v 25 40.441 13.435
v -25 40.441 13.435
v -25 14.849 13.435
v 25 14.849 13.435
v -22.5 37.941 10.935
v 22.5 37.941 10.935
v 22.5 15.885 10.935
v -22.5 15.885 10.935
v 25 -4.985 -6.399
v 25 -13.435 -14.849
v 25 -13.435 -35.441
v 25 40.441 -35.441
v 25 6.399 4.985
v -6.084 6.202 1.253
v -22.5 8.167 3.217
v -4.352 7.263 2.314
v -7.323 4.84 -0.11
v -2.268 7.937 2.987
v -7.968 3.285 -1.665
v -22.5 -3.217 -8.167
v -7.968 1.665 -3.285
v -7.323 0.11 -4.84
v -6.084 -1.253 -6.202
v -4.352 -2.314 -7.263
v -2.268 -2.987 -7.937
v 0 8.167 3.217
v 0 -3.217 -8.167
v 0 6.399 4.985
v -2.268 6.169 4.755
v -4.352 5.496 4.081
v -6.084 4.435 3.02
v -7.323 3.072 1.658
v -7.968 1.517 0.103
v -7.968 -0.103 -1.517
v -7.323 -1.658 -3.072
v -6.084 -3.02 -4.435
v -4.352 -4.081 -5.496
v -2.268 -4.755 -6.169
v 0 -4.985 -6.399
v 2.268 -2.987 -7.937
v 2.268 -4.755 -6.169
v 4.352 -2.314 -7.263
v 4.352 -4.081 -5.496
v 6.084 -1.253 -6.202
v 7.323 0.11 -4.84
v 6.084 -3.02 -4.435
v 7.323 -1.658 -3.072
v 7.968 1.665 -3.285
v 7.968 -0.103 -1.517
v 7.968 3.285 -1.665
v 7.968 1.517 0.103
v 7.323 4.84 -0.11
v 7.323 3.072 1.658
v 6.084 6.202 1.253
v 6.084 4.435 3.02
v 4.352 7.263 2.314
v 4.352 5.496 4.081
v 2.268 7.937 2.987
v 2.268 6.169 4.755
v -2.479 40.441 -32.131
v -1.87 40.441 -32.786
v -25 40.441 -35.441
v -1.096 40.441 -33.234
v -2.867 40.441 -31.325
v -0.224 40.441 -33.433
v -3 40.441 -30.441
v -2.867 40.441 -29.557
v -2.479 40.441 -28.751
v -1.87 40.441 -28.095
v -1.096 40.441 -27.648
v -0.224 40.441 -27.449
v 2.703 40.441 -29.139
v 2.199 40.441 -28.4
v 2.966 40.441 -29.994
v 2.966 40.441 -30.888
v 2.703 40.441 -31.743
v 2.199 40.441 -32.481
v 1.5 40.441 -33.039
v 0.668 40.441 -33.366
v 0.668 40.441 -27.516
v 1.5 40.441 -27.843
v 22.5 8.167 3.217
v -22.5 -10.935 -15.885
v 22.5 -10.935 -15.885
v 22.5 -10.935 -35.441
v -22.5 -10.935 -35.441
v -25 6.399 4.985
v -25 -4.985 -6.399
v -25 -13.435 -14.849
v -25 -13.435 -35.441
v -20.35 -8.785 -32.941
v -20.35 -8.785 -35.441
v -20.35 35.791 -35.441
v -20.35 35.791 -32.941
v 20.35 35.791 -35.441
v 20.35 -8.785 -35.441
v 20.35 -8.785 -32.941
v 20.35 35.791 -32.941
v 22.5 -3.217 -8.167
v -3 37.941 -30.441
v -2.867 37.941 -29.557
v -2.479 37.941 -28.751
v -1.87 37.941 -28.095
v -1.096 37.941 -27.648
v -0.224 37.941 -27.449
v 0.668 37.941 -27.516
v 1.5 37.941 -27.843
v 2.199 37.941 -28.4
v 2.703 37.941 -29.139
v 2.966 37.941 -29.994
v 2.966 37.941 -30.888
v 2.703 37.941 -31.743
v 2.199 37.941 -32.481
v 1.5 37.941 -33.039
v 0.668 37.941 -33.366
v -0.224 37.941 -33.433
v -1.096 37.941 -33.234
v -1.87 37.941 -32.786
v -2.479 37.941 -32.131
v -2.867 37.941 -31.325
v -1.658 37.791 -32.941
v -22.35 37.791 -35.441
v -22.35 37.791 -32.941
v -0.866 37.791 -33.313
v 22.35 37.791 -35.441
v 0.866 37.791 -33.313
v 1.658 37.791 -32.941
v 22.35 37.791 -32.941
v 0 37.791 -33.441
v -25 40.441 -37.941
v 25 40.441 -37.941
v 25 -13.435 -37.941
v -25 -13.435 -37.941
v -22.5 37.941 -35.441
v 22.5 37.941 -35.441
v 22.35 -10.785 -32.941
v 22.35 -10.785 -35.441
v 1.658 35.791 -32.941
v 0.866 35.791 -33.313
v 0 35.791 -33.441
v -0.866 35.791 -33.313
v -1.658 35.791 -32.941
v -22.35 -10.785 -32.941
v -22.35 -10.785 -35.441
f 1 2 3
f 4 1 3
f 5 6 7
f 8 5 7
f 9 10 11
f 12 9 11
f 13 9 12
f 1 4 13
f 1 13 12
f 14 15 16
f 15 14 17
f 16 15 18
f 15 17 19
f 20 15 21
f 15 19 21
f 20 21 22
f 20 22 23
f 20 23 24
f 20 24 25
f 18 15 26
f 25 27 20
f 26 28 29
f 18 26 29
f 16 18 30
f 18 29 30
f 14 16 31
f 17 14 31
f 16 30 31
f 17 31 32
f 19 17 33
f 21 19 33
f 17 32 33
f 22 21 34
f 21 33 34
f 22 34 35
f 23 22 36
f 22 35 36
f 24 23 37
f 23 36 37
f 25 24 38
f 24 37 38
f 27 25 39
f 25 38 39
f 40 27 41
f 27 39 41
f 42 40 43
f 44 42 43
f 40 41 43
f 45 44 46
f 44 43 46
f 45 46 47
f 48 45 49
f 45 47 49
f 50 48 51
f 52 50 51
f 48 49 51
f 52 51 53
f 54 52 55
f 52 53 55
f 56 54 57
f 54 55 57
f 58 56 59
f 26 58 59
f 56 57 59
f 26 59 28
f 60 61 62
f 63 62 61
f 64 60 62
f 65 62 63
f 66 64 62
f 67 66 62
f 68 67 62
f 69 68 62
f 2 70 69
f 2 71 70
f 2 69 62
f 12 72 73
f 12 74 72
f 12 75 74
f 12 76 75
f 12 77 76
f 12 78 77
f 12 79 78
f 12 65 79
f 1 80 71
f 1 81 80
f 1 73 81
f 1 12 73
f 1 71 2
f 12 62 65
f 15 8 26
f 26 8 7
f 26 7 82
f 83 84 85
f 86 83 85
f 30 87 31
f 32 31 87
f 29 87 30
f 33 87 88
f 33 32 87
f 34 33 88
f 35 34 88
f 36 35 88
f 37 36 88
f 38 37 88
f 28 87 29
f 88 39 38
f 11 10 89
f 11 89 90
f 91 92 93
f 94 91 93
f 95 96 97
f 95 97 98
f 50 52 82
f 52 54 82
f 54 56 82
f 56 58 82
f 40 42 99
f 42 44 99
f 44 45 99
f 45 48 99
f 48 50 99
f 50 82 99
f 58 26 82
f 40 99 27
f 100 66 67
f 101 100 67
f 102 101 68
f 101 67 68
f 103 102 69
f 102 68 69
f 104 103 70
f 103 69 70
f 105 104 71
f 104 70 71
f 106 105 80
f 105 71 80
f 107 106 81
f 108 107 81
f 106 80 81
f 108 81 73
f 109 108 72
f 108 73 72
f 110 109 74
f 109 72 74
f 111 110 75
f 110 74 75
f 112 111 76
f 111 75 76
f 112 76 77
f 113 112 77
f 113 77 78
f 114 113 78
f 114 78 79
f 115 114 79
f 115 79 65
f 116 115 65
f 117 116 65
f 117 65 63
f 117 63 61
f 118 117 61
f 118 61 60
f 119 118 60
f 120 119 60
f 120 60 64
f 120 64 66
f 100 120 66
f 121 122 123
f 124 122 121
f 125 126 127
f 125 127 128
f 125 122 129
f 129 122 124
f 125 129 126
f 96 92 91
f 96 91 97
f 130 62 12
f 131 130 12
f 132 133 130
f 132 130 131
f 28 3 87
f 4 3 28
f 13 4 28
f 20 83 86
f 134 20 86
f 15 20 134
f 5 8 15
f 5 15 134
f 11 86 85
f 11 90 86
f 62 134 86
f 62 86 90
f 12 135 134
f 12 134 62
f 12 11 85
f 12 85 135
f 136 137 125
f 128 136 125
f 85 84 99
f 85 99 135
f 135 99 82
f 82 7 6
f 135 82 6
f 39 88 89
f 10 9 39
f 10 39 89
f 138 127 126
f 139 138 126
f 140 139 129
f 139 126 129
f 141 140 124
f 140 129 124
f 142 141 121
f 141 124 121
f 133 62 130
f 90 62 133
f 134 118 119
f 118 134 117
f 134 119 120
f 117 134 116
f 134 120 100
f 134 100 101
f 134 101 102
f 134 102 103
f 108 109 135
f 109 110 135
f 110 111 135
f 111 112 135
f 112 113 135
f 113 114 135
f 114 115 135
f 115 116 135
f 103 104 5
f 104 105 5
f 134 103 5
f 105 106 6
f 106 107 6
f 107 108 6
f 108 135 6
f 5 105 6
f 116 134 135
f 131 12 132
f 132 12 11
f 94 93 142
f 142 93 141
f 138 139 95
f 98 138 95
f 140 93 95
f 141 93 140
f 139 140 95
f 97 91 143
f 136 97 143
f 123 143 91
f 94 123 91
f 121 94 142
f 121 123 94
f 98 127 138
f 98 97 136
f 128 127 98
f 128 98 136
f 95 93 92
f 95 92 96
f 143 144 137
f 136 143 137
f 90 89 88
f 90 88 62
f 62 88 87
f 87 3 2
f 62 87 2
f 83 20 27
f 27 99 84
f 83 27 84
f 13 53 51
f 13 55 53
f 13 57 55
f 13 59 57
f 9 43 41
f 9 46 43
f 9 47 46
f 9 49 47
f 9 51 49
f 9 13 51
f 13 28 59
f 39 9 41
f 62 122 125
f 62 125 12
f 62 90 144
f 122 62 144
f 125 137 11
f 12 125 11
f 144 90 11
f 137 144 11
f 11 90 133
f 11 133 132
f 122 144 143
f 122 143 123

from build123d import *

# Parameters (mm, degrees)
F3_DEPTH  = 25
F4_T      = -2.5
F6_W      = 50
F6_H      = 53.8759757726
F6_W_2    = 45
F6_H_2    = 48.8759757726
F7_DEPTH  = 2.5
F8_W      = 44.7
F8_H      = 48.5759757726
F8_W_2    = 40.7
F8_H_2    = 44.5759757726
F9_DEPTH  = 2.5
F10_R     = 3
F11_DEPTH = 25


with BuildPart() as f1:
    # F0 (on Right) → F1 (revolve)
    with BuildSketch(Plane.YZ):
        Polygon((5.6922095886, 5.6922095886), (0, 0), (24.7487373415, -24.7487373415), (30.4409469301, -19.056527753), align=None)
    revolve(axis=Axis((0, 12.3743686708, -12.3743686708), (0, -0.7071067812, 0.7071067812)))


with BuildPart() as f3:
    # F2 (on Right) → F3 (new body, symmetric)
    with BuildSketch(Plane.YZ):
        Polygon((-4.9851028074, -6.3993163697), (-13.4350288425, -14.8492424049), (-13.4350288425, -35.4409469301), (40.4409469301, -35.4409469301), (40.4409469301, 13.4350288425), (14.8492424049, 13.4350288425), (6.3993163697, 4.9851028074), (7.8135299321, 3.570889245), (15.6776695297, 11.4350288425), (38.4409469301, 11.4350288425), (38.4409469301, -33.4409469301), (-11.4350288425, -33.4409469301), (-11.4350288425, -15.6776695297), (-3.570889245, -7.8135299321), align=None)
        Polygon((6.3993163697, 4.9851028074), (-4.9851028074, -6.3993163697), (-3.570889245, -7.8135299321), (7.8135299321, 3.570889245), align=None)
        Polygon((7.8135299321, 3.570889245), (-3.570889245, -7.8135299321), (-11.4350288425, -15.6776695297), (-11.4350288425, -33.4409469301), (38.4409469301, -33.4409469301), (38.4409469301, 11.4350288425), (15.6776695297, 11.4350288425), align=None)
    extrude(amount=F3_DEPTH, both=True)

    # F4
    f4_openings = [f3.faces().sort_by_distance(p)[0] for p in [
        (0, 13.502959, -35.440947),
    ]]
    offset(amount=F4_T, openings=f4_openings)

    # F5: cut F1
    add(f1.part, mode=Mode.SUBTRACT)


with BuildPart() as f7:
    # F6 (on face) → F7 (new body)
    with BuildSketch(Plane(origin=(0, 0, -35.4409469301), x_dir=(1, 0, 0), z_dir=(0, 0, -1))):
        with Locations((0, -13.5029590438)):
            Rectangle(F6_W, F6_H)
        with Locations((0, -13.5029590438)):
            Rectangle(F6_W_2, F6_H_2, mode=Mode.SUBTRACT)
        with Locations((0, -13.5029590438)):
            Rectangle(F6_W_2, F6_H_2)
    extrude(amount=F7_DEPTH)

    # F8 (on face) → F9 (join)
    with BuildSketch(Plane.XY.offset(-35.4409469301)):
        with Locations((0, 13.5029590438)):
            Rectangle(F8_W, F8_H)
        with Locations((0, 13.5029590438)):
            Rectangle(F8_W_2, F8_H_2, mode=Mode.SUBTRACT)
    extrude(amount=F9_DEPTH)


with BuildPart() as f11_tool:
    # F10 (on face) → F11 (new body)
    with BuildSketch(Plane(origin=(0, 40.4409469301, 0), x_dir=(-1, 0, 0), z_dir=(0, 1, 0))):
        with Locations((0, -30.4409469301)):
            Circle(F10_R)
    extrude(amount=-F11_DEPTH)


with BuildPart() as f3_1:
    add(f3.part)

    # F11: cut by f11_tool
    add(f11_tool.part, mode=Mode.SUBTRACT)


with BuildPart() as f7_1:
    add(f7.part)

    # F11: cut by f11_tool
    add(f11_tool.part, mode=Mode.SUBTRACT)


solid = Compound([f3_1.part, f7_1.part])
